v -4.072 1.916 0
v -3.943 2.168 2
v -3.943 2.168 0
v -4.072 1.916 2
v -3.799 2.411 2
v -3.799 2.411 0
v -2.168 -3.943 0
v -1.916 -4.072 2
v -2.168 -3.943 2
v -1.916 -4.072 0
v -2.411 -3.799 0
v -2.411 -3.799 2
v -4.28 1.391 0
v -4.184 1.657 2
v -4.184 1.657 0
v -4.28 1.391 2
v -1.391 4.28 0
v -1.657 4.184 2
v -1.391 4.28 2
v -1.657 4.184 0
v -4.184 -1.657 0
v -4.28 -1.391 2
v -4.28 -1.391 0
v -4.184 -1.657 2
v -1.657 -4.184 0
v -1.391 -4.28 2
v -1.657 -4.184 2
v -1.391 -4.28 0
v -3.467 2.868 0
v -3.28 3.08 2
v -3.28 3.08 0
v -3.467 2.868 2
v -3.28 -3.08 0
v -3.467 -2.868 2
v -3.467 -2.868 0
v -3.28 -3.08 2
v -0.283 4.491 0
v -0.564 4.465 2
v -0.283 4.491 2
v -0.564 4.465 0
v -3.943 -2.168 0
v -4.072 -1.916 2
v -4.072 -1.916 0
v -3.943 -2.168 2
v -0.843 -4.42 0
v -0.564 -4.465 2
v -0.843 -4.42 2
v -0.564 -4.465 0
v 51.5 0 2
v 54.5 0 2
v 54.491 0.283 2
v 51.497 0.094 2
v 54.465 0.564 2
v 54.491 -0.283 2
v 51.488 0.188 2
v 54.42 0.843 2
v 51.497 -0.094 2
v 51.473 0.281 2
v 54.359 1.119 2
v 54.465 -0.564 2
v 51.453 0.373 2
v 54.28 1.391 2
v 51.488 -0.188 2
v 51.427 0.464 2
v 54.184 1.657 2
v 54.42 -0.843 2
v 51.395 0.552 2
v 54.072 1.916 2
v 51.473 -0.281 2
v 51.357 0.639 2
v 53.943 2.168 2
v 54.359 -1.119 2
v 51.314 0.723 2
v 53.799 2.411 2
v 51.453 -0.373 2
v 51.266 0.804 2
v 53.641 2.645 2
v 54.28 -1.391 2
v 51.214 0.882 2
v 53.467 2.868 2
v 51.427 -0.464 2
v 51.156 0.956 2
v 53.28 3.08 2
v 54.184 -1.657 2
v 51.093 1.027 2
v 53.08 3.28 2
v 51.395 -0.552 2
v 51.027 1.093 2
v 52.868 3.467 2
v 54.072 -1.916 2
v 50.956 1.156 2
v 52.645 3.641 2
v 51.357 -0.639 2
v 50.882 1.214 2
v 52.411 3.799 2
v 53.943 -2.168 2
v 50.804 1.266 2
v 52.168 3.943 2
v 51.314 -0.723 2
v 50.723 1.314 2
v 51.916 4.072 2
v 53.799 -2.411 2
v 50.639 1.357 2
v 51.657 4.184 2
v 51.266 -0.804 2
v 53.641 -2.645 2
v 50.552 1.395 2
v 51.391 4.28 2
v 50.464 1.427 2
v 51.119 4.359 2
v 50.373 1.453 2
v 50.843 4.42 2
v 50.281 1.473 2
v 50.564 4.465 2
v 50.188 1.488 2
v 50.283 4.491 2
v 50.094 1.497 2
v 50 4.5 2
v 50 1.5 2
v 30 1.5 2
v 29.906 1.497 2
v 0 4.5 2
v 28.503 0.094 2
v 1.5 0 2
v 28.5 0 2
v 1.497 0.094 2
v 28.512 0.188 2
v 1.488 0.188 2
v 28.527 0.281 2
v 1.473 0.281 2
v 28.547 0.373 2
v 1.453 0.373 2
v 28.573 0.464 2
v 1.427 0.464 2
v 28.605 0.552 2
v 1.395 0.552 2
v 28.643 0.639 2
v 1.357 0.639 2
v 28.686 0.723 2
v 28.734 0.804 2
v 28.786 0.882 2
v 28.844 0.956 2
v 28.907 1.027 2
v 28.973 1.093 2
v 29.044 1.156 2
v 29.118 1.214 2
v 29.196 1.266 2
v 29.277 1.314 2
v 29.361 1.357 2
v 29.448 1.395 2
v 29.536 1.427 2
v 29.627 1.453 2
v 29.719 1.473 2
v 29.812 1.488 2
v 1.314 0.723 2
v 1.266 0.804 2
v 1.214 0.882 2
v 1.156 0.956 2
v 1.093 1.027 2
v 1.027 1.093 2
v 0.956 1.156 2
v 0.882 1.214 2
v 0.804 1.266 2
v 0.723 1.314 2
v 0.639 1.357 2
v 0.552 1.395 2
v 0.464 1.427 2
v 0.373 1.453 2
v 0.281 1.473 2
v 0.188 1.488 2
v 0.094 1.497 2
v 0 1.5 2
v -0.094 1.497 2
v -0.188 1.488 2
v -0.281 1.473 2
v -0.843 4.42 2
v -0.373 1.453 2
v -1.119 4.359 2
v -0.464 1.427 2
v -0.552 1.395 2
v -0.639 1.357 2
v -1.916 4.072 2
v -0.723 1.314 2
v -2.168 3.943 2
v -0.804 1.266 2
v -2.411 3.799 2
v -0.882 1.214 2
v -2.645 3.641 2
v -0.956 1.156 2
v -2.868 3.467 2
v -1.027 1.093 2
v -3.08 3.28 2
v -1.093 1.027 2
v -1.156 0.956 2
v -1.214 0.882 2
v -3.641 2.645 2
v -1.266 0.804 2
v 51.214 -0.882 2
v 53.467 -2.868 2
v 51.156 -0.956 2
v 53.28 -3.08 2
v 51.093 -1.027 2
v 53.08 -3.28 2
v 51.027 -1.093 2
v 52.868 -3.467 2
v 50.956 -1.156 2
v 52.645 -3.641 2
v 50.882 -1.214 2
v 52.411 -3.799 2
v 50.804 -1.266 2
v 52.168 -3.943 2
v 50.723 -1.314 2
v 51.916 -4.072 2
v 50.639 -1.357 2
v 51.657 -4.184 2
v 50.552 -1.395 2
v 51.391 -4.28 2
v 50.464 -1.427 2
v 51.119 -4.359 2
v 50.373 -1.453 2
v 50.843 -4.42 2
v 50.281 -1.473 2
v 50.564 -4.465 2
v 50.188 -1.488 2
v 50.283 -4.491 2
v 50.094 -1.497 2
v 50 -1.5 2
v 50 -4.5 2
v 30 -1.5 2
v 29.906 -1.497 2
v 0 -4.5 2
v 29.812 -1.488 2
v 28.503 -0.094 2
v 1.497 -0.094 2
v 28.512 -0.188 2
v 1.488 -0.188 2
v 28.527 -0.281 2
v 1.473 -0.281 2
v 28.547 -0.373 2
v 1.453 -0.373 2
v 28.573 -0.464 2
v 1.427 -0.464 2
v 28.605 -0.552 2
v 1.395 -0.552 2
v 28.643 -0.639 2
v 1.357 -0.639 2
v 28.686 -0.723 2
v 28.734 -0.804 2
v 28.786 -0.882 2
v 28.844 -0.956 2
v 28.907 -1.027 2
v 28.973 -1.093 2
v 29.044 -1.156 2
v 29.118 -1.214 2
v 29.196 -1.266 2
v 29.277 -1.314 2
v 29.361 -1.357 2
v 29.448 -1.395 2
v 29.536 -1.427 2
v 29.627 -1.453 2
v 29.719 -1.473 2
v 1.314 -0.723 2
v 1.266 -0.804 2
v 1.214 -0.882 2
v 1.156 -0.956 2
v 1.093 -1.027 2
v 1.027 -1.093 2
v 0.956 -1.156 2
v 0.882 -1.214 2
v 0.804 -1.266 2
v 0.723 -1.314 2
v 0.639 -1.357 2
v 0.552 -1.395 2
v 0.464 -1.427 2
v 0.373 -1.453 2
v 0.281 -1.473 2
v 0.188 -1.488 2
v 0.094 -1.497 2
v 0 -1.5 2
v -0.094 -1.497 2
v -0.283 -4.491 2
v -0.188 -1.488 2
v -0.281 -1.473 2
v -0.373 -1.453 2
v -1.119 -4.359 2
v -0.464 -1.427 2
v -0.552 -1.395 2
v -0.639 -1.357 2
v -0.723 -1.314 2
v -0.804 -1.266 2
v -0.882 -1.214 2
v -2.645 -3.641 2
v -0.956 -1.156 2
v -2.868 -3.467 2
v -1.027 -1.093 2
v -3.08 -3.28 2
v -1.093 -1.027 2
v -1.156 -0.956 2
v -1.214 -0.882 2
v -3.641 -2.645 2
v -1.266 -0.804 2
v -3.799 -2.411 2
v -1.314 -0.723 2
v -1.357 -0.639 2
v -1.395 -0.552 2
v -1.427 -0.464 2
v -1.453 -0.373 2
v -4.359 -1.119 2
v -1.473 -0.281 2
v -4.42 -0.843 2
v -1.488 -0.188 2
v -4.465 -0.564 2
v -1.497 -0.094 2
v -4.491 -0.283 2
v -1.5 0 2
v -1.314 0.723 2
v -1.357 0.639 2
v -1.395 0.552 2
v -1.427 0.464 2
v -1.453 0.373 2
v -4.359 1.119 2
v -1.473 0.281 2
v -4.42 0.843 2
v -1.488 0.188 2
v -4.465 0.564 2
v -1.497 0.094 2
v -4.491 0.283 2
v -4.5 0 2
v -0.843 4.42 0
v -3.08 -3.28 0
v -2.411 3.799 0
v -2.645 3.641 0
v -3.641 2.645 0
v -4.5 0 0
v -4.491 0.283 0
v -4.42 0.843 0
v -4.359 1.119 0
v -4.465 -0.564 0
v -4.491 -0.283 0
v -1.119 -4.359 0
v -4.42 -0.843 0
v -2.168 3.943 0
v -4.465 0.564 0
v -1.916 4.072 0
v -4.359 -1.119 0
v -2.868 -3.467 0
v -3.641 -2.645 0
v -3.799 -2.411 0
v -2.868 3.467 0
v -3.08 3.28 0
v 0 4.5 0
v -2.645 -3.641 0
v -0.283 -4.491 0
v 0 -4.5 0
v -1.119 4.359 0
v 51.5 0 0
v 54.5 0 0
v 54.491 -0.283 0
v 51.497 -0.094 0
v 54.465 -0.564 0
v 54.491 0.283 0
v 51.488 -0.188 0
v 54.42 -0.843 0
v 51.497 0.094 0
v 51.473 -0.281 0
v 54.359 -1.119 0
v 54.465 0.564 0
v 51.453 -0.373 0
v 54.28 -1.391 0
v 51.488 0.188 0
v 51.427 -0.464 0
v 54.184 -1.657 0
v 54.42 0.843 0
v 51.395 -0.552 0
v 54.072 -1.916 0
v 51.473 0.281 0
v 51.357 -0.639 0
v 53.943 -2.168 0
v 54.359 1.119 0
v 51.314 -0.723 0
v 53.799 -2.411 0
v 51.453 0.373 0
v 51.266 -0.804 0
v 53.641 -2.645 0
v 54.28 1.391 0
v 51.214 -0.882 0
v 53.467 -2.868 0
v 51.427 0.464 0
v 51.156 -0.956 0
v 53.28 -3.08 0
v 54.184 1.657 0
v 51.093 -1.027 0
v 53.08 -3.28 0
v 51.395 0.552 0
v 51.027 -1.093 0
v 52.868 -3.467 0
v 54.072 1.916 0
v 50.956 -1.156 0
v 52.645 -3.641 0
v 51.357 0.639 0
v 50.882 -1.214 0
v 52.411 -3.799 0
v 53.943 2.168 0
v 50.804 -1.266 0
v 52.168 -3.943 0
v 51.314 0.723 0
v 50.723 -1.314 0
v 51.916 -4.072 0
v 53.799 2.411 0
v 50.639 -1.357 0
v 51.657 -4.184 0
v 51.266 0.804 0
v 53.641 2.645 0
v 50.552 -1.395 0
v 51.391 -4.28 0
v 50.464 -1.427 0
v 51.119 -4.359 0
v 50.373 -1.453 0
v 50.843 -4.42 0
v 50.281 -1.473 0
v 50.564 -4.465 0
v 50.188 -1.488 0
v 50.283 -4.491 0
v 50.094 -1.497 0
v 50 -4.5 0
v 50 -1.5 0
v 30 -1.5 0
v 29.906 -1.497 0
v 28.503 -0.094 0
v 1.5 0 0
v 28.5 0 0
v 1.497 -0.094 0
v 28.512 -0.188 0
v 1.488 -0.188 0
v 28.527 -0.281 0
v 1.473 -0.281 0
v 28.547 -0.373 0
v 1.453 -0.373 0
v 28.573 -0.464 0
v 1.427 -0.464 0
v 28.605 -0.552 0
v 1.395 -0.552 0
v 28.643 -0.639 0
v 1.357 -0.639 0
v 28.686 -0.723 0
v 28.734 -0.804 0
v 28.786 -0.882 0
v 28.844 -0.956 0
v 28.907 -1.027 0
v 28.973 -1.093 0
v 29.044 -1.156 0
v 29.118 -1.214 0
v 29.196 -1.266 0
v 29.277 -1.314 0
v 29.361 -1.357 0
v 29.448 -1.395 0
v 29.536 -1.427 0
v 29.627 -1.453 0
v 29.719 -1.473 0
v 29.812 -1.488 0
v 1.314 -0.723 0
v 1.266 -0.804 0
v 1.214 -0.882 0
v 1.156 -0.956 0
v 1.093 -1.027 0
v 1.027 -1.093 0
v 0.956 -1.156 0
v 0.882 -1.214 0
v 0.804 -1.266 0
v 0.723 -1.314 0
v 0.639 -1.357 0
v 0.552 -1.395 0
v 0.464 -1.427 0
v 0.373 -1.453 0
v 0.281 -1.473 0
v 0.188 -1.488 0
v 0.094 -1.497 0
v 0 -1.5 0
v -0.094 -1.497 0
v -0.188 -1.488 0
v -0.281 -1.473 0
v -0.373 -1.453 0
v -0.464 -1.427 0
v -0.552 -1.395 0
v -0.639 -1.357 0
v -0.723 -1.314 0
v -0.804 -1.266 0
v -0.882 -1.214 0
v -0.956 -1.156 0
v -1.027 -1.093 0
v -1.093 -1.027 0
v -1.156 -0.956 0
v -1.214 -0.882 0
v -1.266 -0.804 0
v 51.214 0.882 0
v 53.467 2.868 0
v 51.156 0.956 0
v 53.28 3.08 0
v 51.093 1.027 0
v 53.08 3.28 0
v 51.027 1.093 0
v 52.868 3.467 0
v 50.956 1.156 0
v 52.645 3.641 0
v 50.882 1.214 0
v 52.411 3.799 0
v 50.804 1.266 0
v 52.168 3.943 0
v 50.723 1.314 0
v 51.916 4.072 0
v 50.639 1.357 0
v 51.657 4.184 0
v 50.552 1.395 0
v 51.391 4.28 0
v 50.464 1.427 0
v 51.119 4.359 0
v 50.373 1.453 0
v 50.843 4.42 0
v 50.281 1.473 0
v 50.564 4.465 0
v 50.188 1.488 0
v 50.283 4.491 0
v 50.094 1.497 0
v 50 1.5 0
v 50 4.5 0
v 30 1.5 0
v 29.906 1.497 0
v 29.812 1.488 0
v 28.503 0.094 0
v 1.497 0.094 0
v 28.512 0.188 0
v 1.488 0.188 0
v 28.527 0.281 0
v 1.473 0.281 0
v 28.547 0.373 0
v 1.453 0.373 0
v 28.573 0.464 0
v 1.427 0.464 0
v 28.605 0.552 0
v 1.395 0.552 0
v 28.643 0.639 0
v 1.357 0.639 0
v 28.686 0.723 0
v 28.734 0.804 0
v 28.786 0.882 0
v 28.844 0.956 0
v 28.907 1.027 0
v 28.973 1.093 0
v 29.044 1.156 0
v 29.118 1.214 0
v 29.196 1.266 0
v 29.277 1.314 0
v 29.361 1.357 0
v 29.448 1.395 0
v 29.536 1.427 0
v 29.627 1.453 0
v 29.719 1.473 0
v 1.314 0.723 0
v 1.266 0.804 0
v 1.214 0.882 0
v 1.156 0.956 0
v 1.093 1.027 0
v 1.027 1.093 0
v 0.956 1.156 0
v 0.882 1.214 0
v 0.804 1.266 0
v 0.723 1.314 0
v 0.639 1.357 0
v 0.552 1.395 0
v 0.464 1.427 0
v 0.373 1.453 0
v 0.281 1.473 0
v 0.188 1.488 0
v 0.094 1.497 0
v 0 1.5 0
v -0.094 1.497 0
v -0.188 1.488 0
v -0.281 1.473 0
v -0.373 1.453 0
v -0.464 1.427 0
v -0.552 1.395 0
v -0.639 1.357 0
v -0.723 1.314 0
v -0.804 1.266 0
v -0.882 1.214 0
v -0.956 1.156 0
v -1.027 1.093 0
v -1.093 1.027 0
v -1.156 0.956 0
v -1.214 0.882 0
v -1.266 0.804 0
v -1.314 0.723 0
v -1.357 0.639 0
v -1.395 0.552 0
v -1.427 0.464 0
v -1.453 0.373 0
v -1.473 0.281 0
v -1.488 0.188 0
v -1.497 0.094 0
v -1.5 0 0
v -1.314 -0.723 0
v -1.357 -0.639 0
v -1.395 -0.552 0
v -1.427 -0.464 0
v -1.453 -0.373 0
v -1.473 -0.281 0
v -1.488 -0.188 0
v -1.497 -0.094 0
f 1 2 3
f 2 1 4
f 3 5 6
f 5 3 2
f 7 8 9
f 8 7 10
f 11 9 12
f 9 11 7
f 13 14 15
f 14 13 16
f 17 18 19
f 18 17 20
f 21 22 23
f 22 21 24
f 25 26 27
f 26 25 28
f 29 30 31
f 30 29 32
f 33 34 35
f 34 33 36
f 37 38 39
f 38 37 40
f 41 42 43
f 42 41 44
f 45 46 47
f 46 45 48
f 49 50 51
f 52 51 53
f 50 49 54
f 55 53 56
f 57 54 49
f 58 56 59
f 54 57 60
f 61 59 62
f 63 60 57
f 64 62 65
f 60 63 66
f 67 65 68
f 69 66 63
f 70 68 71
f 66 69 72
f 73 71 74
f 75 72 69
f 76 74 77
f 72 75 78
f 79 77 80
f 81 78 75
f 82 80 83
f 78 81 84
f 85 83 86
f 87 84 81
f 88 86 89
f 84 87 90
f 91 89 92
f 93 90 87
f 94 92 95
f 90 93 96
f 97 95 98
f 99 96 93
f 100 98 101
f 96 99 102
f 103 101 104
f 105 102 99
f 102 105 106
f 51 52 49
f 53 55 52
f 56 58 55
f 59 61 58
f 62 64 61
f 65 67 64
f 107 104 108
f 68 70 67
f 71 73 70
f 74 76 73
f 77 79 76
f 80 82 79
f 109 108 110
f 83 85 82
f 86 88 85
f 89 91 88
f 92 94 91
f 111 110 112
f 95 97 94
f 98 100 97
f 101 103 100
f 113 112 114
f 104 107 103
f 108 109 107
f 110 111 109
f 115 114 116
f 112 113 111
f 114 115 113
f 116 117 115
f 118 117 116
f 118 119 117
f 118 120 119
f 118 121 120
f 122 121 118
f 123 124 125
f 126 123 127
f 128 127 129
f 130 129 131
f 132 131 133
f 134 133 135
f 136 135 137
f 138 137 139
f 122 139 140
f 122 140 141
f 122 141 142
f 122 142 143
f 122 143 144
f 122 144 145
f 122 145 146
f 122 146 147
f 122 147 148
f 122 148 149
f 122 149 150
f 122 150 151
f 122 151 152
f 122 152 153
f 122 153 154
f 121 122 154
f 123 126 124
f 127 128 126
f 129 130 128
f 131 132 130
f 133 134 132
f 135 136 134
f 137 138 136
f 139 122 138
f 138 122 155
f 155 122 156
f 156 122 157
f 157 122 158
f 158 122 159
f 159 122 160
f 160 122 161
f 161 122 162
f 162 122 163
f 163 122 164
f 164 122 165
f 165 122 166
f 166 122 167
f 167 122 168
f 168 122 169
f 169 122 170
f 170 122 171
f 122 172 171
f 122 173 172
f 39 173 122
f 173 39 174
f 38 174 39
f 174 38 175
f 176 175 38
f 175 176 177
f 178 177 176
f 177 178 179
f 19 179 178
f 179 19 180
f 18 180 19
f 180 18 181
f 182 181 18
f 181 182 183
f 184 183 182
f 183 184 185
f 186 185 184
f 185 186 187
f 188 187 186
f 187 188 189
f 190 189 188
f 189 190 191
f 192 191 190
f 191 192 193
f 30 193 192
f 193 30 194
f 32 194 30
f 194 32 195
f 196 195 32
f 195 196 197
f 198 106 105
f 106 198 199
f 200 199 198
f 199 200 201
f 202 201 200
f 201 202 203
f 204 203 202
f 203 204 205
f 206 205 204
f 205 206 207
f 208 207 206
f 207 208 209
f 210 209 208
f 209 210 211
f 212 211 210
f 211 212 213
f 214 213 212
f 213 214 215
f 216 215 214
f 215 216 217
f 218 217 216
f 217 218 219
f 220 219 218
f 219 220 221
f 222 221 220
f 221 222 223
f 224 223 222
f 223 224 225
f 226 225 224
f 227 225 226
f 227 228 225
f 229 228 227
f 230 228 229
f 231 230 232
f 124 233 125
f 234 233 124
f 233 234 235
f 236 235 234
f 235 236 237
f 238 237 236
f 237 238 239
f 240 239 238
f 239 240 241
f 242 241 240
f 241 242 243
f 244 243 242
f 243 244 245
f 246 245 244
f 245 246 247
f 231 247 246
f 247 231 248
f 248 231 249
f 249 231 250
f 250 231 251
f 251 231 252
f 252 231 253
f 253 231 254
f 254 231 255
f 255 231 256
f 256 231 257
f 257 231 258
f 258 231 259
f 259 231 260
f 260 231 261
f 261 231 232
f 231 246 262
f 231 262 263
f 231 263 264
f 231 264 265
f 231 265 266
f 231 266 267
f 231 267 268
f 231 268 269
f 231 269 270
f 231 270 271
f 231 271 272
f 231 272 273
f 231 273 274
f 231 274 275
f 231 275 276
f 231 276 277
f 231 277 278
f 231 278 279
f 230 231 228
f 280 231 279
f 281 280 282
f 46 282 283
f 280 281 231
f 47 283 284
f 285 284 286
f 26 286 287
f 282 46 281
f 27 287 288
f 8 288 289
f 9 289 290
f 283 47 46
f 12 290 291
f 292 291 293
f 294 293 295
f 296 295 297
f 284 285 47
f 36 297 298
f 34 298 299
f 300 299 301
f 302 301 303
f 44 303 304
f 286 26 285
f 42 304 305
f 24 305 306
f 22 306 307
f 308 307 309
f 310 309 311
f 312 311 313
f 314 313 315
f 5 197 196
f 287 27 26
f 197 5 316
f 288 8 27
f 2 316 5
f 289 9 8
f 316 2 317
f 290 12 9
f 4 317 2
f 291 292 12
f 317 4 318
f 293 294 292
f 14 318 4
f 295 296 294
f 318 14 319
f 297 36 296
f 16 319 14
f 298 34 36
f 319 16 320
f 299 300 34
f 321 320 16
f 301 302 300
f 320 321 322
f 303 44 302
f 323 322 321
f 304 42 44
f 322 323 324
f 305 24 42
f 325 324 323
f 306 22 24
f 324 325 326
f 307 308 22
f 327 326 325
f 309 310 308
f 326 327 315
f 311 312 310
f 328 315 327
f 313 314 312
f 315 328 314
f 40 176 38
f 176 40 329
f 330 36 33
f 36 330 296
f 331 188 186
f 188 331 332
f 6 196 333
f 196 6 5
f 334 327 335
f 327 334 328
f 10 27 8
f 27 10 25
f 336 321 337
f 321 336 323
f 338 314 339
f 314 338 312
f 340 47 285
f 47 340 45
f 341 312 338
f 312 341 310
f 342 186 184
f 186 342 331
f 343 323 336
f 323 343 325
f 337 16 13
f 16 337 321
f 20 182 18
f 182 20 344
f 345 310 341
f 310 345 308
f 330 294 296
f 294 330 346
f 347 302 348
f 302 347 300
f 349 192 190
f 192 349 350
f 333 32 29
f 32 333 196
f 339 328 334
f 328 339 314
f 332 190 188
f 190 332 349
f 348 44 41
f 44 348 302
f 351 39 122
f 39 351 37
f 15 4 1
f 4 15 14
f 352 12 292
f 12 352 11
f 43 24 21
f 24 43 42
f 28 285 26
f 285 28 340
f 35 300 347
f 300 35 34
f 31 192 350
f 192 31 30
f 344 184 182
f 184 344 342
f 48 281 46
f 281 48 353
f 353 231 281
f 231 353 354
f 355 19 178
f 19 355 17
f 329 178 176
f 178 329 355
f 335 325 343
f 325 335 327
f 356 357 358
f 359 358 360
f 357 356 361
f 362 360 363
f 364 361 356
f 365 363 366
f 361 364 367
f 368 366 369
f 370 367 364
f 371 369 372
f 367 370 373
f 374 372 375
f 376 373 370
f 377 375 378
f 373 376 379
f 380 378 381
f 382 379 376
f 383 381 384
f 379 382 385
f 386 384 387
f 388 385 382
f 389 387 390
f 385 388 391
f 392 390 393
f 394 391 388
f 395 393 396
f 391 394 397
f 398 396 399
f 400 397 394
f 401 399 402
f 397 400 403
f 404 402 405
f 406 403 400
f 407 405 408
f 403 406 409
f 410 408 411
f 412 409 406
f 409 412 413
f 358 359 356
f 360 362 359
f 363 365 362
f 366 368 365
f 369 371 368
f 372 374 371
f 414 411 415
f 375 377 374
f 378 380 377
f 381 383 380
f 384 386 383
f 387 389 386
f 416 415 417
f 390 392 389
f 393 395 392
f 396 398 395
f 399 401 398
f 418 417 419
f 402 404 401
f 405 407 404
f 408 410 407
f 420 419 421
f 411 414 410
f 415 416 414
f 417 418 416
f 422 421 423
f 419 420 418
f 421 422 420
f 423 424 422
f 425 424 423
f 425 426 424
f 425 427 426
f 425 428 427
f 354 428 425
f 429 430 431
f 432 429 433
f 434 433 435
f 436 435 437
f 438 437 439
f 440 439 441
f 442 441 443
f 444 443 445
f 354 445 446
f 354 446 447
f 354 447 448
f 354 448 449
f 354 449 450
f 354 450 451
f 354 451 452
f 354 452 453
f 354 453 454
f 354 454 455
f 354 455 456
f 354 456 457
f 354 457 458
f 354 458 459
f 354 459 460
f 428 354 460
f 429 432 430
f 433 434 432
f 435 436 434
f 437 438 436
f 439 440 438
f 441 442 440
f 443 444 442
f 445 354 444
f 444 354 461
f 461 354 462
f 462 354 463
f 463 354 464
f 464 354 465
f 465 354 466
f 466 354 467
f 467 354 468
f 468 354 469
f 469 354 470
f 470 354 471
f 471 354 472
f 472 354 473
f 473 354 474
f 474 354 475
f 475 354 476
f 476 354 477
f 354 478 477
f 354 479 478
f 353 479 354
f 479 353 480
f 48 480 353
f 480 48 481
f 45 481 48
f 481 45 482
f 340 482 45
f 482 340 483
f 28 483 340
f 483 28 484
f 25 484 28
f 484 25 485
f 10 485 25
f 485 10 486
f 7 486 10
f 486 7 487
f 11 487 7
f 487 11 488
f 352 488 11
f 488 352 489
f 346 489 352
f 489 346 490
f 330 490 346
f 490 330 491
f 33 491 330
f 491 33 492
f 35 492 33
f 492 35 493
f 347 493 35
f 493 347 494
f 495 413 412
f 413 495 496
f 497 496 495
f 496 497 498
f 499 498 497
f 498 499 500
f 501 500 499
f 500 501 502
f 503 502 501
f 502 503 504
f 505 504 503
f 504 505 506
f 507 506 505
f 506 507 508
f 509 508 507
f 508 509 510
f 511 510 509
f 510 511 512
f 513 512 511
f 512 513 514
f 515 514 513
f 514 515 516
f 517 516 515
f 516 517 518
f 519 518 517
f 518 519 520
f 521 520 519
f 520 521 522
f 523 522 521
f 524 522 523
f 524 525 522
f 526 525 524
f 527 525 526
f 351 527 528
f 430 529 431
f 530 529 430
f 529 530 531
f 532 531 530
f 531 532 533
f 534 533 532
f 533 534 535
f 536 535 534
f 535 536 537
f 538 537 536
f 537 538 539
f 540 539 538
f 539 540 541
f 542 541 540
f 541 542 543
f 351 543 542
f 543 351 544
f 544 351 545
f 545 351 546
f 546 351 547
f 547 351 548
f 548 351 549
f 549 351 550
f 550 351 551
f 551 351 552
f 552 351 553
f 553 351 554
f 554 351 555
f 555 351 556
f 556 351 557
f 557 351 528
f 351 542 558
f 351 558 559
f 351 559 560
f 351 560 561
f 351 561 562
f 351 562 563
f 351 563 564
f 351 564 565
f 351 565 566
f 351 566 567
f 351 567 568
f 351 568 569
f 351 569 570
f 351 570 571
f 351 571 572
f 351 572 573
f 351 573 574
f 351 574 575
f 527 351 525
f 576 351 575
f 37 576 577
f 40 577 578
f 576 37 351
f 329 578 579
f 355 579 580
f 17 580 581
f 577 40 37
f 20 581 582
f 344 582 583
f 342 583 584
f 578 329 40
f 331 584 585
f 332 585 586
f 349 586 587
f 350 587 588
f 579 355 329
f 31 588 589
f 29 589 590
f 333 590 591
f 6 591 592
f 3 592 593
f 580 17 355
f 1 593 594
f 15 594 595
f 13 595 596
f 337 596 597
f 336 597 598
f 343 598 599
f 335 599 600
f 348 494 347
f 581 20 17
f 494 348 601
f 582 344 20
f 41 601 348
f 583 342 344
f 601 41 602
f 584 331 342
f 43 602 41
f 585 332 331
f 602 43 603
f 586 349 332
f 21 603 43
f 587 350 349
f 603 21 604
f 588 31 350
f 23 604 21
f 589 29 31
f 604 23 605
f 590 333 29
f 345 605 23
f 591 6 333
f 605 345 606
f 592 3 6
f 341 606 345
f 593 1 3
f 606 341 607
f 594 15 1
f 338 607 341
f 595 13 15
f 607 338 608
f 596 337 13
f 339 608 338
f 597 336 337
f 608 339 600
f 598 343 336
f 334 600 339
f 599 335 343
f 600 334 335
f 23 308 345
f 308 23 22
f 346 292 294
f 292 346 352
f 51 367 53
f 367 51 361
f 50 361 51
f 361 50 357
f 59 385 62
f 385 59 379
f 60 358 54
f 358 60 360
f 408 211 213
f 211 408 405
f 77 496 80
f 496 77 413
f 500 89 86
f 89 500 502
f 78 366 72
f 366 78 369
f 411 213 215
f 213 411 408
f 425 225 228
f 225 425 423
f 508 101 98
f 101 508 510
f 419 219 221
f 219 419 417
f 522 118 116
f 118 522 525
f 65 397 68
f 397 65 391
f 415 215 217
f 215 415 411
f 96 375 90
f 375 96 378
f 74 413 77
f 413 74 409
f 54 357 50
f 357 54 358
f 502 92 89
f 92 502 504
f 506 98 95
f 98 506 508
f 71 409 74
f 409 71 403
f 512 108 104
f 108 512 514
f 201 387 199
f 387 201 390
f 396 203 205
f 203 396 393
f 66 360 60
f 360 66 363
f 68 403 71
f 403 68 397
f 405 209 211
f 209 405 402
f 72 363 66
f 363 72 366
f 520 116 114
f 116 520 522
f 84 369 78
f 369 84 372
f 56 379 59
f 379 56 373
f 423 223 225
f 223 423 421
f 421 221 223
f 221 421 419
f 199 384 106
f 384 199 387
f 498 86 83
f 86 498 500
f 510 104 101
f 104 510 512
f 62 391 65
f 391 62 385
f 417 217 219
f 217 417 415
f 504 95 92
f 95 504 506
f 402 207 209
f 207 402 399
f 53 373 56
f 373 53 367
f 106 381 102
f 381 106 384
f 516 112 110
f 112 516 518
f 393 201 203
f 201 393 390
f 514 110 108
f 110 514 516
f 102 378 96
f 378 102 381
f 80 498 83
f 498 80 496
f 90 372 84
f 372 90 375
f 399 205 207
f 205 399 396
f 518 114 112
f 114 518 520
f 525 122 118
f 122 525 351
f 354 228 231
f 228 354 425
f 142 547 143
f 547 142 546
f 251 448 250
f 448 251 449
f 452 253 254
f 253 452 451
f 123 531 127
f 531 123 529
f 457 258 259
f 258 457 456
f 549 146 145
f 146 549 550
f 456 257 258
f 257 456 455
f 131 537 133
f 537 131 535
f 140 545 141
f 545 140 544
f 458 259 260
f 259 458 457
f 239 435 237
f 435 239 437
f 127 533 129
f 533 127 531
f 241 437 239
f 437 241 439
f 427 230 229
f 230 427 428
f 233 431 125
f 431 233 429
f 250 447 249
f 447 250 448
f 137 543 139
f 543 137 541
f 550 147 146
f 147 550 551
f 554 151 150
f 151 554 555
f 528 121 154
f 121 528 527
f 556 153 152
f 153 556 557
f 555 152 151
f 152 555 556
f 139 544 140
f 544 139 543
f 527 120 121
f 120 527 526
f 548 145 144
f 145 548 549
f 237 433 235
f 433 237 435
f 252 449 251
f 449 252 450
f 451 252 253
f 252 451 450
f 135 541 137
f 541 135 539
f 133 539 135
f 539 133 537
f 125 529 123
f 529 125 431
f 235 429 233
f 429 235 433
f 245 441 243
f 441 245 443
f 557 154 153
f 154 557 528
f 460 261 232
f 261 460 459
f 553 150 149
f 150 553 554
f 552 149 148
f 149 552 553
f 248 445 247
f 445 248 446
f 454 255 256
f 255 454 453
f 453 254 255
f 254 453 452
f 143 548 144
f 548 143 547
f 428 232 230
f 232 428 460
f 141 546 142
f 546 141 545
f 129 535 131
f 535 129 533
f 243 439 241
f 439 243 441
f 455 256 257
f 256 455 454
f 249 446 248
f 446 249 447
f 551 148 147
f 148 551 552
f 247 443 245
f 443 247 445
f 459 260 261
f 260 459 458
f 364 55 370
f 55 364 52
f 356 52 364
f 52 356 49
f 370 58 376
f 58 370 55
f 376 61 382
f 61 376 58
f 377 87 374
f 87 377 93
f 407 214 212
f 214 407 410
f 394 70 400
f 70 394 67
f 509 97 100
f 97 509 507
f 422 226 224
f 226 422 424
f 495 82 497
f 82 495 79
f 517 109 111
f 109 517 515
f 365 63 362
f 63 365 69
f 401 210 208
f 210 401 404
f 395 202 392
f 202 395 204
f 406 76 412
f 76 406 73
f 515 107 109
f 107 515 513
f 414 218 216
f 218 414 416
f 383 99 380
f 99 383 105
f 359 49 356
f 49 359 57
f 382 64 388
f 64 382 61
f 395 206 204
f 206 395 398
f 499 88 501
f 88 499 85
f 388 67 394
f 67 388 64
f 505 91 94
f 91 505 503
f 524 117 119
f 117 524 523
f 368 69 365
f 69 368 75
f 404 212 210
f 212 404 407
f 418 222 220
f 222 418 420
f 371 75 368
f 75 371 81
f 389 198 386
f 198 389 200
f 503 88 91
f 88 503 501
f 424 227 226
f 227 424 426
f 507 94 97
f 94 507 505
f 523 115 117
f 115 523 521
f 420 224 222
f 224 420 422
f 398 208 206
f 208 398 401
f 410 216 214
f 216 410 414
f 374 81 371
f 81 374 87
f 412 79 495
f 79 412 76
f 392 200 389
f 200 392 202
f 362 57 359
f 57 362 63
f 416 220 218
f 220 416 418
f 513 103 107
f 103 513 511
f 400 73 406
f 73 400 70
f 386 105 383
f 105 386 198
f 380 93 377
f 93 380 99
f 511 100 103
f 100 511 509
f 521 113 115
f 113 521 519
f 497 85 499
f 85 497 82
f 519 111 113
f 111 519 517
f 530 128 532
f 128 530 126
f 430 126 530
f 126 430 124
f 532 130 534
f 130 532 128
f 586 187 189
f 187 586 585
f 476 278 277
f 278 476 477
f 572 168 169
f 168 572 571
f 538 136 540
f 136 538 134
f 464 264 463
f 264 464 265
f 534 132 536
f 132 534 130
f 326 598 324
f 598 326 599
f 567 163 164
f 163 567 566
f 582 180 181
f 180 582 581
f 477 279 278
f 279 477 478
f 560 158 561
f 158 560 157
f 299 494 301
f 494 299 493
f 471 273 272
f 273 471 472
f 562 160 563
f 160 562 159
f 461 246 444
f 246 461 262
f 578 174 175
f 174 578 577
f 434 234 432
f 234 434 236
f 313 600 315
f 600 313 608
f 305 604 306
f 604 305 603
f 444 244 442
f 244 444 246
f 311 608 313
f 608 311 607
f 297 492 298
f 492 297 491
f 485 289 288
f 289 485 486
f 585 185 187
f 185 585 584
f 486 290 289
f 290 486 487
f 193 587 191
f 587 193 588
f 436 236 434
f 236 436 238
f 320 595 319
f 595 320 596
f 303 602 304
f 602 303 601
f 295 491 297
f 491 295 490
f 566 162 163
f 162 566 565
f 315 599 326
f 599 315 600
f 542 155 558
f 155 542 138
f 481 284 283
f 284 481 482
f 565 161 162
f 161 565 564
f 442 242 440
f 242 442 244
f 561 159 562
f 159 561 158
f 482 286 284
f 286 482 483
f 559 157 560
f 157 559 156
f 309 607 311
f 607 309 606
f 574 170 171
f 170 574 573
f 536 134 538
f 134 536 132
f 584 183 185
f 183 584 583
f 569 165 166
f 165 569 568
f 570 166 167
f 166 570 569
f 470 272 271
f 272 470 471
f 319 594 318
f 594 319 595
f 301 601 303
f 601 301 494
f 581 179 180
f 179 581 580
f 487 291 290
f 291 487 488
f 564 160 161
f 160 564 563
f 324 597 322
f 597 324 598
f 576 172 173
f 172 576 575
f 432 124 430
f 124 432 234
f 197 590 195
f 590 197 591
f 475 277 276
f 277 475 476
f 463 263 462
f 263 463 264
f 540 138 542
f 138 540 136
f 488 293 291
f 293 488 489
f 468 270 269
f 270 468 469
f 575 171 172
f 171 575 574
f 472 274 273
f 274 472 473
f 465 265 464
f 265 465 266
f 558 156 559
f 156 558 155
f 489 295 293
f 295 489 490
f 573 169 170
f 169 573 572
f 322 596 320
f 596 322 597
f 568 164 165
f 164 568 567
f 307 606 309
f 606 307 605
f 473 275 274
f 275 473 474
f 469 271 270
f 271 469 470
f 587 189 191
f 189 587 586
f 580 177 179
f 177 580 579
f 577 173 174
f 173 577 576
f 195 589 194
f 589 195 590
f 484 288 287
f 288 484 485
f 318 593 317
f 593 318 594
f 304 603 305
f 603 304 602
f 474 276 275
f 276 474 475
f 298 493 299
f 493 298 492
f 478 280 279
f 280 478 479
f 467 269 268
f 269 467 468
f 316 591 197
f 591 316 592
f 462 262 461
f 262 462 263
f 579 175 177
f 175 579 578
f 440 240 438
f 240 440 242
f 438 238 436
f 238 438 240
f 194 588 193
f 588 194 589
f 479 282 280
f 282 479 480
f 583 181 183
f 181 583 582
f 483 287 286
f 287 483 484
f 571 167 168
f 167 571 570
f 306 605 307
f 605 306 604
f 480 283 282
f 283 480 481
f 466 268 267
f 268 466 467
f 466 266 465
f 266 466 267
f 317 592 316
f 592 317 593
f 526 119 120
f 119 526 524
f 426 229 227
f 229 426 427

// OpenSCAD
//Adjustable link
//By Johan Bengtsson qwerty_42@hotmail.com


//(in mm)
HoleSize=3;

//(in mm)
Distance1=30;

//(in mm)
Distance2=50;

//(in mm)
Thickness=2;


//(in percent of hole size)
WallWidth=100;

/* [Hidden] */

Width=HoleSize*(1+WallWidth/50);
MinDistance=min(Distance1,Distance2);
MaxDistance=max(Distance1,Distance2);

$fn=100;

difference()
{
	union()
	{
		cylinder(h=Thickness,r=Width/2);
		translate([MaxDistance,0,0]) cylinder(h=Thickness,r=Width/2);
		translate([0,-Width/2,0]) cube([MaxDistance,Width,Thickness]);
	}
	union()
	{
		translate([MinDistance,0,-1]) cylinder(h=Thickness+2,r=HoleSize/2);
		translate([MaxDistance,0,-1]) cylinder(h=Thickness+2,r=HoleSize/2);
		translate([0,0,-1]) cylinder(h=Thickness+2,r=HoleSize/2);
		translate([MinDistance,-HoleSize/2,-1]) cube([MaxDistance-MinDistance,HoleSize,Thickness+2]);
	}
}


